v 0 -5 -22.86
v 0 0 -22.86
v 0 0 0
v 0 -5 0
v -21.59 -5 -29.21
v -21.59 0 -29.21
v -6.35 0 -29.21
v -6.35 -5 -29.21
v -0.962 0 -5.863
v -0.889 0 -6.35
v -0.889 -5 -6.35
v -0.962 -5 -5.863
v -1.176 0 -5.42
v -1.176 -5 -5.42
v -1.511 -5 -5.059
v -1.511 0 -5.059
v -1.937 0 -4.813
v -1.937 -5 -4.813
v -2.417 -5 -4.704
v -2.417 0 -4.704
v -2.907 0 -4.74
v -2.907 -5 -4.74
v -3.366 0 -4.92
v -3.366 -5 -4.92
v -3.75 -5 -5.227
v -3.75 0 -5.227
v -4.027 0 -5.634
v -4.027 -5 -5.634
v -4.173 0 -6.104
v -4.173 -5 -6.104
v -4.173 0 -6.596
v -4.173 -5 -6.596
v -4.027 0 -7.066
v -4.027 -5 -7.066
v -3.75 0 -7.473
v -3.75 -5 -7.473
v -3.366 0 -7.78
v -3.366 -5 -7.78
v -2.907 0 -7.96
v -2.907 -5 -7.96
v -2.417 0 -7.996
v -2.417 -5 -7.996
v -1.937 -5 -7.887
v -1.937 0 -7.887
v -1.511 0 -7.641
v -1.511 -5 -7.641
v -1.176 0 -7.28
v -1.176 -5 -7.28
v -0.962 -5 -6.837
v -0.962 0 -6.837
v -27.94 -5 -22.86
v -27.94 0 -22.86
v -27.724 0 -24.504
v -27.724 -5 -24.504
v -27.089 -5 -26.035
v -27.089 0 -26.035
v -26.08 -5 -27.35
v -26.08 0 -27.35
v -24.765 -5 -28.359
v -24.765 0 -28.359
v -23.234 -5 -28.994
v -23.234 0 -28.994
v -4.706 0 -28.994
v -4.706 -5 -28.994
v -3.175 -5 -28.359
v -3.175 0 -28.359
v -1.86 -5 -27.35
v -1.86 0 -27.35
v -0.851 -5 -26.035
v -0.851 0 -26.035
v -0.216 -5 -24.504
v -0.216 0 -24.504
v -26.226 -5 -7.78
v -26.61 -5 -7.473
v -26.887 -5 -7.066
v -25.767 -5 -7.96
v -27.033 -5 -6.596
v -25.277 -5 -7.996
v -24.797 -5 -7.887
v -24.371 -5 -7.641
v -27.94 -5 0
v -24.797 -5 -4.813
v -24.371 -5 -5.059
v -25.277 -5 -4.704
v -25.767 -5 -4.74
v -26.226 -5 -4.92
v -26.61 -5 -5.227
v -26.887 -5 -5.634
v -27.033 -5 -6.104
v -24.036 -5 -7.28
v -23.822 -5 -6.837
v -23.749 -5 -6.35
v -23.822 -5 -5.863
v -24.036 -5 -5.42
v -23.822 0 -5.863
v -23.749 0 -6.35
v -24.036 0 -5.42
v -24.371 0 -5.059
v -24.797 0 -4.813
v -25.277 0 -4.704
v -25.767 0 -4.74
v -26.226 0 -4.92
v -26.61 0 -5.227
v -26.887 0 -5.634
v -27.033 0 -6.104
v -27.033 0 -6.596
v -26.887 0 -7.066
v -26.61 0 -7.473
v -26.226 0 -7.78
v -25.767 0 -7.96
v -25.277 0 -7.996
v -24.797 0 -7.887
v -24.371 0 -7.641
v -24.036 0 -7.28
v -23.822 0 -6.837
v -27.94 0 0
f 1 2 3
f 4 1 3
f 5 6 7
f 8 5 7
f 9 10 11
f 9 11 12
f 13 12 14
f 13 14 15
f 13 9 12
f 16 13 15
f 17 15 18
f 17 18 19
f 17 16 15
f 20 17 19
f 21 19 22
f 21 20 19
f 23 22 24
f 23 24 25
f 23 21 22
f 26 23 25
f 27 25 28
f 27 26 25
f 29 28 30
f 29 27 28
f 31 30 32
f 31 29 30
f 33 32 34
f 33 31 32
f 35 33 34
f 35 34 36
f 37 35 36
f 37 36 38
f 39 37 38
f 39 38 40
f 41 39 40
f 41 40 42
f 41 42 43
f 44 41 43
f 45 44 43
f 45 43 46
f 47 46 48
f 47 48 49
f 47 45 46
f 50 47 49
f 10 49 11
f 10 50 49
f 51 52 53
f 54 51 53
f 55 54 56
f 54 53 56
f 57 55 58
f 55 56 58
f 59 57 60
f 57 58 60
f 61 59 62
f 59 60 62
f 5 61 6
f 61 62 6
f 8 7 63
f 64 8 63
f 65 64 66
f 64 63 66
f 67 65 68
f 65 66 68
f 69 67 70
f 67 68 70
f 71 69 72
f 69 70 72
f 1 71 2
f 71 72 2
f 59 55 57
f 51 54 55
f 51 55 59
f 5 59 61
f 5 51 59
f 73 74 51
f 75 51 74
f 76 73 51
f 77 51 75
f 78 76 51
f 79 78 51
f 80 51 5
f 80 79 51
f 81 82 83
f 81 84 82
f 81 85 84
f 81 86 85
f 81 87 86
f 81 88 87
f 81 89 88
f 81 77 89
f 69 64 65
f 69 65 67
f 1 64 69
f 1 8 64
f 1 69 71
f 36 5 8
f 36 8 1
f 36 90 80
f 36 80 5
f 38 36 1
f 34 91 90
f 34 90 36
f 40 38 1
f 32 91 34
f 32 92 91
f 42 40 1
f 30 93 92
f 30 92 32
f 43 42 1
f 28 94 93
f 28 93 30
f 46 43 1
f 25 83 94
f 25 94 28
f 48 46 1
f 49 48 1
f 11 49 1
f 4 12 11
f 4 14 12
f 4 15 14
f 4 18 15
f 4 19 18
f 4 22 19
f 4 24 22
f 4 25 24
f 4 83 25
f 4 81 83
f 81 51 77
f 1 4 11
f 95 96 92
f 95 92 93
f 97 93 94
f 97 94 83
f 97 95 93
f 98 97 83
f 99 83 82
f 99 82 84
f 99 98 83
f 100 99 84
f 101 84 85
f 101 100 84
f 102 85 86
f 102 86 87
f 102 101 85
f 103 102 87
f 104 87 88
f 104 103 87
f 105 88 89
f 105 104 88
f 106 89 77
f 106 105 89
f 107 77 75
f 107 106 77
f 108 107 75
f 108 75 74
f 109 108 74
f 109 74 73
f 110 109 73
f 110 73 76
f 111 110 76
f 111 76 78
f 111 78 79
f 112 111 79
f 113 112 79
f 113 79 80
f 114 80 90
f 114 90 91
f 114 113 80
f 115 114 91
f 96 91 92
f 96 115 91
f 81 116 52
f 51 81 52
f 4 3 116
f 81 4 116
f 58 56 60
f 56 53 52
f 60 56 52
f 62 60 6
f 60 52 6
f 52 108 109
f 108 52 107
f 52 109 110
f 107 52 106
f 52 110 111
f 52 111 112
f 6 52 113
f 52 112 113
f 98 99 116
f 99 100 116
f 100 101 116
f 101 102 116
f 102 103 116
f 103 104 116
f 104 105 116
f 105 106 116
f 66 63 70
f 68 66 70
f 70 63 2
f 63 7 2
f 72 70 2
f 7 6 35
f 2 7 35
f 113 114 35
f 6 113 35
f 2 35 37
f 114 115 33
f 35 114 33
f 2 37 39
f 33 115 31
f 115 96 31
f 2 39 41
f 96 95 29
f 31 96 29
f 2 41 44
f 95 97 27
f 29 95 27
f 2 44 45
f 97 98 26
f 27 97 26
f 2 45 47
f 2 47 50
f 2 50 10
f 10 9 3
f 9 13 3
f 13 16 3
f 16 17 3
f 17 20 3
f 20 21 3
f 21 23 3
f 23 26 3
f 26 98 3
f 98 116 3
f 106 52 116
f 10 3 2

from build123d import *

# Parameters (mm, degrees)
F0_R     = 1.651
F1_DEPTH = 5


with BuildPart() as f1:
    # F0 (on Front) → F1 (new body)
    with BuildSketch(Plane.XZ):
        with BuildLine():
            Line((0, 0), (-27.94, 0))
            Line((-27.94, 0), (-27.94, -22.86))
            ThreePointArc((-27.94, -22.86), (-26.080128, -27.350128), (-21.59, -29.21))
            Line((-21.59, -29.21), (-6.35, -29.21))
            ThreePointArc((-6.35, -29.21), (-1.859872, -27.350128), (0, -22.86))
            Line((0, -22.86), (0, 0))
        make_face()
        with Locations((-25.4, -6.35)):
            Circle(F0_R, mode=Mode.SUBTRACT)
        with Locations((-2.54, -6.35)):
            Circle(F0_R, mode=Mode.SUBTRACT)
    extrude(amount=F1_DEPTH)


solid = f1.part
